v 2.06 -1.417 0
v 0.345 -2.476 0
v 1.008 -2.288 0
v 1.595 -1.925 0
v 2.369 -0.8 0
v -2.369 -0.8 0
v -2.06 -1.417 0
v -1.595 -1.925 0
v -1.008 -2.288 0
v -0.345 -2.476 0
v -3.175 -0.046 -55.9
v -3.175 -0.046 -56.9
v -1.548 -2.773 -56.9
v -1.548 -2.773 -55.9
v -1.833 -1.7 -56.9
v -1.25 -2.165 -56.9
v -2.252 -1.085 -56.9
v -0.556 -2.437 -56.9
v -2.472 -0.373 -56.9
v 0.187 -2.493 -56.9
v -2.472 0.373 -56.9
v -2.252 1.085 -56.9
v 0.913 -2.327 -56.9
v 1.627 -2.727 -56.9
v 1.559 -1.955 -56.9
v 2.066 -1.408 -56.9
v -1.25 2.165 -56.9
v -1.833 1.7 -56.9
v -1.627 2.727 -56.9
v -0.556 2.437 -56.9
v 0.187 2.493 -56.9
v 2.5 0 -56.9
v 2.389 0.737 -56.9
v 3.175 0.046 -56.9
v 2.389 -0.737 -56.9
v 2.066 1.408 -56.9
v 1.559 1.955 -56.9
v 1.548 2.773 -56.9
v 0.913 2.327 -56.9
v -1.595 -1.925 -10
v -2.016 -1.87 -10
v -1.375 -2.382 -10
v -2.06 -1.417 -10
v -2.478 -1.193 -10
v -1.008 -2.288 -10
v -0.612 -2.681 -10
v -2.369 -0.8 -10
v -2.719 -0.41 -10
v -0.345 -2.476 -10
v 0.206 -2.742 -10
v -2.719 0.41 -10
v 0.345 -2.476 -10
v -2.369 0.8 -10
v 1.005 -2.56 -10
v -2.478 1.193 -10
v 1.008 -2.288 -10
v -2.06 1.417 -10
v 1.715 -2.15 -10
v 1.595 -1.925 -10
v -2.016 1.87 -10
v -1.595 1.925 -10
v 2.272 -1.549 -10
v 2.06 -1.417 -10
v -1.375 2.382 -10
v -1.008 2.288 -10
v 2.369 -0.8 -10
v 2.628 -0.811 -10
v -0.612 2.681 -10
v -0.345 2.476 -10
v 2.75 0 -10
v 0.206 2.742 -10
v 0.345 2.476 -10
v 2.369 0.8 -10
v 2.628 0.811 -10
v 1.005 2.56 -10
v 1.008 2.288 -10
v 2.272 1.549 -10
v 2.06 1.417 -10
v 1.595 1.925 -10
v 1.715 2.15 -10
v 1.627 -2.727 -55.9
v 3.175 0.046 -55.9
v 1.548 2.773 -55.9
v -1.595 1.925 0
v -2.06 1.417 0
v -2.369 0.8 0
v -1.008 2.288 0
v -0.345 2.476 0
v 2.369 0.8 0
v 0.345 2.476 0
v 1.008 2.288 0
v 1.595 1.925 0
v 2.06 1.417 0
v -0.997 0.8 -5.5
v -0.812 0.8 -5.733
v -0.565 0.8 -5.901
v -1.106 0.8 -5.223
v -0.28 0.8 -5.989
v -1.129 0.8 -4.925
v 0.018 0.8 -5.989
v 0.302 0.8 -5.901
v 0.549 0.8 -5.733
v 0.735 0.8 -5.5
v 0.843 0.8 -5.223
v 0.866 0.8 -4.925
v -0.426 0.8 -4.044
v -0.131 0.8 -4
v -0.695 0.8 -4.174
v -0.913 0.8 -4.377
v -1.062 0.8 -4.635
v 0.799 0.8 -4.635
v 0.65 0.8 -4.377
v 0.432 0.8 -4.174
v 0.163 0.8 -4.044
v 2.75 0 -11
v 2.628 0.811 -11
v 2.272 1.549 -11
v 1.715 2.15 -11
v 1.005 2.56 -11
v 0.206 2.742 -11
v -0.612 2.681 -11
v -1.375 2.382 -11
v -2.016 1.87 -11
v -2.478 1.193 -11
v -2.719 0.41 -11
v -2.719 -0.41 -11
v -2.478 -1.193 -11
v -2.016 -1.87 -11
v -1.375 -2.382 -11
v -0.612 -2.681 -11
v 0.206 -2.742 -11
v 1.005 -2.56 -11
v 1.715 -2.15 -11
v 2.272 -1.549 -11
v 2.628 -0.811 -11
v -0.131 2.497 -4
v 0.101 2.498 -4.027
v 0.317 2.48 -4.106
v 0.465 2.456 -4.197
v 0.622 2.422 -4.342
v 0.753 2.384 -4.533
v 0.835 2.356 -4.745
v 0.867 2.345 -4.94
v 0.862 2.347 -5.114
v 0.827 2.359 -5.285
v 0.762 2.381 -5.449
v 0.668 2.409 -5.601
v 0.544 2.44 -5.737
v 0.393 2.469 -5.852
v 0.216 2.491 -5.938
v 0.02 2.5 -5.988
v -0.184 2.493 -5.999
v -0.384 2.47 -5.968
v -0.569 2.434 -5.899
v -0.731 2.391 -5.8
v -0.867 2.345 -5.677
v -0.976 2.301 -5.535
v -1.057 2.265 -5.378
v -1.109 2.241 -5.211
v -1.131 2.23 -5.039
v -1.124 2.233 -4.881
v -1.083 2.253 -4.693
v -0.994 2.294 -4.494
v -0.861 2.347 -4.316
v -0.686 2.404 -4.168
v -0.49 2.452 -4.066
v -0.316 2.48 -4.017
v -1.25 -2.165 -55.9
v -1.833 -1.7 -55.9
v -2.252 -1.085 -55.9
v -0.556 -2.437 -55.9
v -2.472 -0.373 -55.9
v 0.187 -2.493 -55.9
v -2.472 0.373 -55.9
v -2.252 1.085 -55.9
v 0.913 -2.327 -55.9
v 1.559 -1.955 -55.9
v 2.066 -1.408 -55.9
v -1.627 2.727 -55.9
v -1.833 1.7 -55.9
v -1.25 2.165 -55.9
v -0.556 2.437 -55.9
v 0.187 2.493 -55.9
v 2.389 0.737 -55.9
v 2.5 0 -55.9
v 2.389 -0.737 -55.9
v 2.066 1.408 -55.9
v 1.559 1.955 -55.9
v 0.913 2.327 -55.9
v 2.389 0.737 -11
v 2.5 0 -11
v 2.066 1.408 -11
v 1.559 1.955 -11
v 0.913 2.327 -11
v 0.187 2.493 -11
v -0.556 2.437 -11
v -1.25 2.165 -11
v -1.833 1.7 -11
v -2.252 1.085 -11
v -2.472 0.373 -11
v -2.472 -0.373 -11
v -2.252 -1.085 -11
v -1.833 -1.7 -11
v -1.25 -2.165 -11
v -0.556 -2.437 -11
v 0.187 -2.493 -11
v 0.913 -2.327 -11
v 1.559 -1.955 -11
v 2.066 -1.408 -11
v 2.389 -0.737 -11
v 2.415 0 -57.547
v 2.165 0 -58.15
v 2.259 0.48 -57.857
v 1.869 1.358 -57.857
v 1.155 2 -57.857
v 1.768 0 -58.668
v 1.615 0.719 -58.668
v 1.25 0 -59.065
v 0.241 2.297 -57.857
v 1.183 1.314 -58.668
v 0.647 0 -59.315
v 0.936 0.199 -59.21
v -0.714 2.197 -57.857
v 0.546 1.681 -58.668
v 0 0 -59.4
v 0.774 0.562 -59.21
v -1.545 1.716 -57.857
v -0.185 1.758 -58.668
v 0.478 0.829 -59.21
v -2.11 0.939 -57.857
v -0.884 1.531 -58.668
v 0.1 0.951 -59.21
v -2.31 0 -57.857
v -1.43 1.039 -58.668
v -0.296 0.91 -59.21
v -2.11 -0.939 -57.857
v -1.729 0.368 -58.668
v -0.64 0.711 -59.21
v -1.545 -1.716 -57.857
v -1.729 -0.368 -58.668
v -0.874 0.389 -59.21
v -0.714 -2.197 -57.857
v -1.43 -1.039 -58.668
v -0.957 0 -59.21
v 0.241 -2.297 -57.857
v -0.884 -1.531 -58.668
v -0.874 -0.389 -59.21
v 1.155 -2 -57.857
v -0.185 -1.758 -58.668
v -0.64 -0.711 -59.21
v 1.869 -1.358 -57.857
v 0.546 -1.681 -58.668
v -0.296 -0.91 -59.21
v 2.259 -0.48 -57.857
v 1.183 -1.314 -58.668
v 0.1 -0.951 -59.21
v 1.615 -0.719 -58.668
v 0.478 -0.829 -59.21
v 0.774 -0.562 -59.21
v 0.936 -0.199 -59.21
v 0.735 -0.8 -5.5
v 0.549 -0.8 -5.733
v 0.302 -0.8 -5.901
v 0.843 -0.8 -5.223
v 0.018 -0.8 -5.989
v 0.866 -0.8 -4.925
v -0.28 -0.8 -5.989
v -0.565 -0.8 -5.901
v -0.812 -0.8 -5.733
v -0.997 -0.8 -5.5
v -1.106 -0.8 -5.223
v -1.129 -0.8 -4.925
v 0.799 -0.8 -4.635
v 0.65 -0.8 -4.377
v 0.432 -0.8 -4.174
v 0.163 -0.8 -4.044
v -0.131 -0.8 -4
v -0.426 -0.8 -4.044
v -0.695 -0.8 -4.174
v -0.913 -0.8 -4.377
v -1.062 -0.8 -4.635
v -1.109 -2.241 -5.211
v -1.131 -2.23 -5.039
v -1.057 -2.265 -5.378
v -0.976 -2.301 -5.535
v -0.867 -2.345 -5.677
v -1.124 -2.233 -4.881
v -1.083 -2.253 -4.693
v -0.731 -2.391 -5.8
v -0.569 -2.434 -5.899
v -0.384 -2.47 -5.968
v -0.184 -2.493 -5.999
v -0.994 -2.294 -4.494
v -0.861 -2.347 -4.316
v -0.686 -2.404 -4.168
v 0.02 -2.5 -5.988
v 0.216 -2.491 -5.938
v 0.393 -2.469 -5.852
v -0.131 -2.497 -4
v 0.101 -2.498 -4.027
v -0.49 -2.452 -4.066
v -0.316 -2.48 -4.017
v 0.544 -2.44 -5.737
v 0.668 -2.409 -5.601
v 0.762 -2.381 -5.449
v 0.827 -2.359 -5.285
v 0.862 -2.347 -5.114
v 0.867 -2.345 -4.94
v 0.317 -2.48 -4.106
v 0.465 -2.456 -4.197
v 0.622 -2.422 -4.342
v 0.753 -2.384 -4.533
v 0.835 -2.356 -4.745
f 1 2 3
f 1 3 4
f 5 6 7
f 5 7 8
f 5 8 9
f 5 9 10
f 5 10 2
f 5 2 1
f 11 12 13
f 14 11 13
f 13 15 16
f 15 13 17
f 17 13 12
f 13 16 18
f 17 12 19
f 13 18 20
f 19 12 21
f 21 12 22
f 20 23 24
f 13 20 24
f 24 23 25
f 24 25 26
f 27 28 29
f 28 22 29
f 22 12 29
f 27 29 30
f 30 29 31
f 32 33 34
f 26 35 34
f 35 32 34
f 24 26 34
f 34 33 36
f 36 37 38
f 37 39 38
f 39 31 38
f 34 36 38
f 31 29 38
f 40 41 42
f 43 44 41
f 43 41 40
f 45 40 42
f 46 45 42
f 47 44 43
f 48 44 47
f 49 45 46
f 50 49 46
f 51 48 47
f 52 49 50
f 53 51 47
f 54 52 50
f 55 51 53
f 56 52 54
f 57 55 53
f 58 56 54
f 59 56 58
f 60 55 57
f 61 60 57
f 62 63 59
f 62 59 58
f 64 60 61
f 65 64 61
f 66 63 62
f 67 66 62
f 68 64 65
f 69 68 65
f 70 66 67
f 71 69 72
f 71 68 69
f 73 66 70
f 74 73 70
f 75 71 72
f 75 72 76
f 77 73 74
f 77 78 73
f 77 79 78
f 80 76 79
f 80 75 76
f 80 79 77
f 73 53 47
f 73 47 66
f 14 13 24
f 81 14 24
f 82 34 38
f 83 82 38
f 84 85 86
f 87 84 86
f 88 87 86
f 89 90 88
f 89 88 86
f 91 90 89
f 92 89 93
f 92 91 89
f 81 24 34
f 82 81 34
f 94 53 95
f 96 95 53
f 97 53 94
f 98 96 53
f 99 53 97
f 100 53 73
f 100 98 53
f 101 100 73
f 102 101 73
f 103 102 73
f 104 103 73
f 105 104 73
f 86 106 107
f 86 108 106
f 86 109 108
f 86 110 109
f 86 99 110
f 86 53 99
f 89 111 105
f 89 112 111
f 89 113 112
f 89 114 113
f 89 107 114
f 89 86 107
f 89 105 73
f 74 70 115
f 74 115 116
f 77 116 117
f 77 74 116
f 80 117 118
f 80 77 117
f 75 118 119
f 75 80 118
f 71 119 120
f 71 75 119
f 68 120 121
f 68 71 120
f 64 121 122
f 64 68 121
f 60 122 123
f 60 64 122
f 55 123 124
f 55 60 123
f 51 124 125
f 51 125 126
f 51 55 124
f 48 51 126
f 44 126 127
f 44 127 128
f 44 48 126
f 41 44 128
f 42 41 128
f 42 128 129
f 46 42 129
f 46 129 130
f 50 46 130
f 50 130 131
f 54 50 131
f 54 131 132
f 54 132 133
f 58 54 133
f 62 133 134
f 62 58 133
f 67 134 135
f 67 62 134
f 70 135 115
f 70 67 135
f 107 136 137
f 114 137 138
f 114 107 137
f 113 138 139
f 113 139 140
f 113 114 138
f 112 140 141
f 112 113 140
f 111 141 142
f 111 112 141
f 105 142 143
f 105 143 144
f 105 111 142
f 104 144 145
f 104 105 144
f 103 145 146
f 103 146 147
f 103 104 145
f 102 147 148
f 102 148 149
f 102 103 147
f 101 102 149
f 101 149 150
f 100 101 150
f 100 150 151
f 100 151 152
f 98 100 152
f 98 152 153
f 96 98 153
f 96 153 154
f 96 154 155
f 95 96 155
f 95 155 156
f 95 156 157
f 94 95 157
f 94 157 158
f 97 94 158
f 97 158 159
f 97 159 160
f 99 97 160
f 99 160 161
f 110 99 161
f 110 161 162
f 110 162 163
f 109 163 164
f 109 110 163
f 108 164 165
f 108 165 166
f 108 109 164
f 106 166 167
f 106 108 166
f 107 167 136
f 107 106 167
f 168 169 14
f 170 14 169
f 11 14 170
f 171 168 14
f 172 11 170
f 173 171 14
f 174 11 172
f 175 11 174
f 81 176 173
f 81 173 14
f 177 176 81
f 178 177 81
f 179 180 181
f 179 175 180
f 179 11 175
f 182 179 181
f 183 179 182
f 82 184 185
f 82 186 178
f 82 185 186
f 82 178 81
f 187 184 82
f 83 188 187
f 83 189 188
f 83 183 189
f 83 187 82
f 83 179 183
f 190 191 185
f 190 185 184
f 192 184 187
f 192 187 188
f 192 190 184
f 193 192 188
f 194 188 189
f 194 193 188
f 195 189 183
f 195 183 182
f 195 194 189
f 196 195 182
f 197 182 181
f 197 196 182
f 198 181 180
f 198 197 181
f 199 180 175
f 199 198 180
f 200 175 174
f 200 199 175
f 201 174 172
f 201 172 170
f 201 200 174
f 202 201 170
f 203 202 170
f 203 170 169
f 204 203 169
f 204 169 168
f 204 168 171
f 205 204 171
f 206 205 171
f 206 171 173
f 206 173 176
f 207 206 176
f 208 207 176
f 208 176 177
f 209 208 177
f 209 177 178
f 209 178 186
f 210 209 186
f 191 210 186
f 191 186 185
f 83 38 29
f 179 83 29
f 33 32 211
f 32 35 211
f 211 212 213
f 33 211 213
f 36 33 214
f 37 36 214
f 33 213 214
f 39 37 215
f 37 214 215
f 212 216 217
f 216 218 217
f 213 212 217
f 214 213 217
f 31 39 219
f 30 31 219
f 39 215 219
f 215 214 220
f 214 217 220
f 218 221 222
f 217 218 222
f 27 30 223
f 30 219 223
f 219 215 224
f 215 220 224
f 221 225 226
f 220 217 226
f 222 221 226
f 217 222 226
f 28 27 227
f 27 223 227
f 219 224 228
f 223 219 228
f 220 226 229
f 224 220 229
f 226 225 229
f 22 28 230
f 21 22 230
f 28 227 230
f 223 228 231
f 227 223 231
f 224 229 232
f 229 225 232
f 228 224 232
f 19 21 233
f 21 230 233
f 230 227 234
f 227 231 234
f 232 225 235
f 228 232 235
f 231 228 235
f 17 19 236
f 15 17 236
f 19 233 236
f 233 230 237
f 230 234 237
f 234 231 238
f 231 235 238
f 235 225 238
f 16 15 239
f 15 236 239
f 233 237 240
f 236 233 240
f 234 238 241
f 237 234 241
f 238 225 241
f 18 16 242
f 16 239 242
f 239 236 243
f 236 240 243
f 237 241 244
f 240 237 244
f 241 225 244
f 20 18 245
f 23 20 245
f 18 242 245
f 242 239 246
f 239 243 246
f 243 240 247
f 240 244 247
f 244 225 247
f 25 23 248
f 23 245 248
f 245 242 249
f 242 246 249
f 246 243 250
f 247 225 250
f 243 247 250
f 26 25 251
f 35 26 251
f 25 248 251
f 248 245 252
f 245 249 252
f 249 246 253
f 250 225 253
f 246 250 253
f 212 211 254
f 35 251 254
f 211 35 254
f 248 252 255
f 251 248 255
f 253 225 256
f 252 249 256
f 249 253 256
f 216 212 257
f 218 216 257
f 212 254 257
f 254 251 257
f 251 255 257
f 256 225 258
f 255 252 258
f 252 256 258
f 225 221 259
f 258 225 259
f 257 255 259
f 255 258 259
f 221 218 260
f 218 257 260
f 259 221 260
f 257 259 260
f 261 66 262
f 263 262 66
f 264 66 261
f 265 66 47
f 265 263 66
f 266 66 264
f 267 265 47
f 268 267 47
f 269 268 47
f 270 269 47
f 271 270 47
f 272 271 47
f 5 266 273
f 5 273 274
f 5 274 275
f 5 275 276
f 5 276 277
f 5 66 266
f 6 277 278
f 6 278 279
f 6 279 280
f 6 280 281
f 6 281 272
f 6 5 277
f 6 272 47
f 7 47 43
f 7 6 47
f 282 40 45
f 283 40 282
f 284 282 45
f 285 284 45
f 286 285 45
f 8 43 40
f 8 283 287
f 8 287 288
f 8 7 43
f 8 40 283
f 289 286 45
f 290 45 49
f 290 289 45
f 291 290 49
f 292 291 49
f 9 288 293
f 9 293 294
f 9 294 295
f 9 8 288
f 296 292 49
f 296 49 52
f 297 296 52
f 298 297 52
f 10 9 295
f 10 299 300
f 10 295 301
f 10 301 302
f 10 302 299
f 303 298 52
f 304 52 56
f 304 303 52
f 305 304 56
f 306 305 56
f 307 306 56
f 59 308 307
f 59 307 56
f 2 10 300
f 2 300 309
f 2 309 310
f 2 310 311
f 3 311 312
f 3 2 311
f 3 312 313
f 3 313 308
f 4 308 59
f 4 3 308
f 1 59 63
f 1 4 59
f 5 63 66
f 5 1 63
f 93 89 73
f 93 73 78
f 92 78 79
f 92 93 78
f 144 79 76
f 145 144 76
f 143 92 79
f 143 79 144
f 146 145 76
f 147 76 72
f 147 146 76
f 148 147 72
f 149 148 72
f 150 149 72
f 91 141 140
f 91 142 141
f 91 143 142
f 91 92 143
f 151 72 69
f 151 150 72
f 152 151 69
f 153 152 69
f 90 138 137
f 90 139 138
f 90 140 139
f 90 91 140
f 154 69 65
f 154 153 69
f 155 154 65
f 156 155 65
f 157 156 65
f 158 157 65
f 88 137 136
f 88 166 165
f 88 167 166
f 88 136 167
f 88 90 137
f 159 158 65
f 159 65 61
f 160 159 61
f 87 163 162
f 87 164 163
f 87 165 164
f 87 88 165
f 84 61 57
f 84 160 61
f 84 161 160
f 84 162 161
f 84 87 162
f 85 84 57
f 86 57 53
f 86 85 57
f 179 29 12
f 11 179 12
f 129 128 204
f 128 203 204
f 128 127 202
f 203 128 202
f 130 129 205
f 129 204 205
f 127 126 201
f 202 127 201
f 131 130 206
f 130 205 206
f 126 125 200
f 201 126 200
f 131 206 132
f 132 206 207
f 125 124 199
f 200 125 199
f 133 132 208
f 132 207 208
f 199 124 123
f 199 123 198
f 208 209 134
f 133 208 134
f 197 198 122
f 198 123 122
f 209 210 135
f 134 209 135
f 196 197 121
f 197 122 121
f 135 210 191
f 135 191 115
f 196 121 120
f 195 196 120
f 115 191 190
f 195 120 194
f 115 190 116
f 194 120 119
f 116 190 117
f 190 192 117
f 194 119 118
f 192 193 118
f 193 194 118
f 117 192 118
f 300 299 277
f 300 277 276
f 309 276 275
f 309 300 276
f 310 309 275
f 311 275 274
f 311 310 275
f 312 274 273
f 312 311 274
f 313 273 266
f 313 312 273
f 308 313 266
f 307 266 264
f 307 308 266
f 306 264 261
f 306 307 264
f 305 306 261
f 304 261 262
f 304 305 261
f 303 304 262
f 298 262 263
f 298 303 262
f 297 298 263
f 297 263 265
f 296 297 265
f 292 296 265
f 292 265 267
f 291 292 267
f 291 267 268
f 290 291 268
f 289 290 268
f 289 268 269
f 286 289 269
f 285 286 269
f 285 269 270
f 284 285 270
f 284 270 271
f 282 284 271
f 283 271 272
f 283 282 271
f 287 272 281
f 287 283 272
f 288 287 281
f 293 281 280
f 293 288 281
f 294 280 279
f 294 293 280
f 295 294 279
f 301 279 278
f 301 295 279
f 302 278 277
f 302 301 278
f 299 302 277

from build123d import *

# Parameters (mm, degrees)
SKETCH1_R               = 2.5
BOSS_EXTRUDE1_DEPTH     = 59.4
CUT_EXTRUDE1_DEPTH      = 10
SKETCH3_R               = 2.75
BOSS_EXTRUDE2_DEPTH     = 1
FILLET1_R               = 2.5
BOSS_EXTRUDE3_DEPTH     = 1
CUT_EXTRUDE2_DEPTH      = 60.549382271
CUT_EXTRUDE2_DEPTH_BACK = 60.549382271
SKETCH5_R               = 1


with BuildPart() as part:
    # Sketch1 → Boss-Extrude1 (new body)
    with BuildSketch(Plane.XY):
        Circle(SKETCH1_R)
    extrude(amount=-BOSS_EXTRUDE1_DEPTH)

    # Sketch2 → Cut-Extrude1 (cut)
    with BuildSketch(Plane.XY):
        with BuildLine():
            Line((-2.368543856, 0.8), (2.368543856, 0.8))
            ThreePointArc((2.368543856, 0.8), (2.5, 0), (2.368543856, -0.8))
            Line((2.368543856, -0.8), (-2.368543856, -0.8))
            ThreePointArc((-2.368543856, -0.8), (-2.5, 0), (-2.368543856, 0.8))
        make_face()
    extrude(amount=-CUT_EXTRUDE1_DEPTH, mode=Mode.SUBTRACT)

    # Sketch3 → Boss-Extrude2 (add)
    with BuildSketch(Plane.XY.offset(-10)):
        Circle(SKETCH3_R)
    extrude(amount=-BOSS_EXTRUDE2_DEPTH)

    # Fillet1
    fillet1_edges = [part.edges().sort_by_distance(p)[0] for p in [
        (-2.5, 0, -59.4),
    ]]
    fillet(fillet1_edges, radius=FILLET1_R)

    # Sketch4 → Boss-Extrude3 (add)
    with BuildSketch(Plane.XY.offset(-56.9)):
        Polygon((1.547782106, 2.772670894), (-1.627312377, 2.726754071), (-3.175094483, -0.045916823), (-1.547782106, -2.772670894), (1.627312377, -2.726754071), (3.175094483, 0.045916823), align=None)
    extrude(amount=BOSS_EXTRUDE3_DEPTH)

    # Sketch5 → Cut-Extrude2 (cut, two sides: drawn at the far end of the back side and taken through both)
    with BuildSketch(Plane(origin=(0, 0, 0), x_dir=(1, 0, 0), z_dir=(0, 1, 0)).offset(-CUT_EXTRUDE2_DEPTH_BACK)):
        with Locations(Location((-0.131456144, 5, 0), (0, 0, 270))):
            Circle(SKETCH5_R)
    extrude(amount=CUT_EXTRUDE2_DEPTH + CUT_EXTRUDE2_DEPTH_BACK, mode=Mode.SUBTRACT)


solid = part.part
